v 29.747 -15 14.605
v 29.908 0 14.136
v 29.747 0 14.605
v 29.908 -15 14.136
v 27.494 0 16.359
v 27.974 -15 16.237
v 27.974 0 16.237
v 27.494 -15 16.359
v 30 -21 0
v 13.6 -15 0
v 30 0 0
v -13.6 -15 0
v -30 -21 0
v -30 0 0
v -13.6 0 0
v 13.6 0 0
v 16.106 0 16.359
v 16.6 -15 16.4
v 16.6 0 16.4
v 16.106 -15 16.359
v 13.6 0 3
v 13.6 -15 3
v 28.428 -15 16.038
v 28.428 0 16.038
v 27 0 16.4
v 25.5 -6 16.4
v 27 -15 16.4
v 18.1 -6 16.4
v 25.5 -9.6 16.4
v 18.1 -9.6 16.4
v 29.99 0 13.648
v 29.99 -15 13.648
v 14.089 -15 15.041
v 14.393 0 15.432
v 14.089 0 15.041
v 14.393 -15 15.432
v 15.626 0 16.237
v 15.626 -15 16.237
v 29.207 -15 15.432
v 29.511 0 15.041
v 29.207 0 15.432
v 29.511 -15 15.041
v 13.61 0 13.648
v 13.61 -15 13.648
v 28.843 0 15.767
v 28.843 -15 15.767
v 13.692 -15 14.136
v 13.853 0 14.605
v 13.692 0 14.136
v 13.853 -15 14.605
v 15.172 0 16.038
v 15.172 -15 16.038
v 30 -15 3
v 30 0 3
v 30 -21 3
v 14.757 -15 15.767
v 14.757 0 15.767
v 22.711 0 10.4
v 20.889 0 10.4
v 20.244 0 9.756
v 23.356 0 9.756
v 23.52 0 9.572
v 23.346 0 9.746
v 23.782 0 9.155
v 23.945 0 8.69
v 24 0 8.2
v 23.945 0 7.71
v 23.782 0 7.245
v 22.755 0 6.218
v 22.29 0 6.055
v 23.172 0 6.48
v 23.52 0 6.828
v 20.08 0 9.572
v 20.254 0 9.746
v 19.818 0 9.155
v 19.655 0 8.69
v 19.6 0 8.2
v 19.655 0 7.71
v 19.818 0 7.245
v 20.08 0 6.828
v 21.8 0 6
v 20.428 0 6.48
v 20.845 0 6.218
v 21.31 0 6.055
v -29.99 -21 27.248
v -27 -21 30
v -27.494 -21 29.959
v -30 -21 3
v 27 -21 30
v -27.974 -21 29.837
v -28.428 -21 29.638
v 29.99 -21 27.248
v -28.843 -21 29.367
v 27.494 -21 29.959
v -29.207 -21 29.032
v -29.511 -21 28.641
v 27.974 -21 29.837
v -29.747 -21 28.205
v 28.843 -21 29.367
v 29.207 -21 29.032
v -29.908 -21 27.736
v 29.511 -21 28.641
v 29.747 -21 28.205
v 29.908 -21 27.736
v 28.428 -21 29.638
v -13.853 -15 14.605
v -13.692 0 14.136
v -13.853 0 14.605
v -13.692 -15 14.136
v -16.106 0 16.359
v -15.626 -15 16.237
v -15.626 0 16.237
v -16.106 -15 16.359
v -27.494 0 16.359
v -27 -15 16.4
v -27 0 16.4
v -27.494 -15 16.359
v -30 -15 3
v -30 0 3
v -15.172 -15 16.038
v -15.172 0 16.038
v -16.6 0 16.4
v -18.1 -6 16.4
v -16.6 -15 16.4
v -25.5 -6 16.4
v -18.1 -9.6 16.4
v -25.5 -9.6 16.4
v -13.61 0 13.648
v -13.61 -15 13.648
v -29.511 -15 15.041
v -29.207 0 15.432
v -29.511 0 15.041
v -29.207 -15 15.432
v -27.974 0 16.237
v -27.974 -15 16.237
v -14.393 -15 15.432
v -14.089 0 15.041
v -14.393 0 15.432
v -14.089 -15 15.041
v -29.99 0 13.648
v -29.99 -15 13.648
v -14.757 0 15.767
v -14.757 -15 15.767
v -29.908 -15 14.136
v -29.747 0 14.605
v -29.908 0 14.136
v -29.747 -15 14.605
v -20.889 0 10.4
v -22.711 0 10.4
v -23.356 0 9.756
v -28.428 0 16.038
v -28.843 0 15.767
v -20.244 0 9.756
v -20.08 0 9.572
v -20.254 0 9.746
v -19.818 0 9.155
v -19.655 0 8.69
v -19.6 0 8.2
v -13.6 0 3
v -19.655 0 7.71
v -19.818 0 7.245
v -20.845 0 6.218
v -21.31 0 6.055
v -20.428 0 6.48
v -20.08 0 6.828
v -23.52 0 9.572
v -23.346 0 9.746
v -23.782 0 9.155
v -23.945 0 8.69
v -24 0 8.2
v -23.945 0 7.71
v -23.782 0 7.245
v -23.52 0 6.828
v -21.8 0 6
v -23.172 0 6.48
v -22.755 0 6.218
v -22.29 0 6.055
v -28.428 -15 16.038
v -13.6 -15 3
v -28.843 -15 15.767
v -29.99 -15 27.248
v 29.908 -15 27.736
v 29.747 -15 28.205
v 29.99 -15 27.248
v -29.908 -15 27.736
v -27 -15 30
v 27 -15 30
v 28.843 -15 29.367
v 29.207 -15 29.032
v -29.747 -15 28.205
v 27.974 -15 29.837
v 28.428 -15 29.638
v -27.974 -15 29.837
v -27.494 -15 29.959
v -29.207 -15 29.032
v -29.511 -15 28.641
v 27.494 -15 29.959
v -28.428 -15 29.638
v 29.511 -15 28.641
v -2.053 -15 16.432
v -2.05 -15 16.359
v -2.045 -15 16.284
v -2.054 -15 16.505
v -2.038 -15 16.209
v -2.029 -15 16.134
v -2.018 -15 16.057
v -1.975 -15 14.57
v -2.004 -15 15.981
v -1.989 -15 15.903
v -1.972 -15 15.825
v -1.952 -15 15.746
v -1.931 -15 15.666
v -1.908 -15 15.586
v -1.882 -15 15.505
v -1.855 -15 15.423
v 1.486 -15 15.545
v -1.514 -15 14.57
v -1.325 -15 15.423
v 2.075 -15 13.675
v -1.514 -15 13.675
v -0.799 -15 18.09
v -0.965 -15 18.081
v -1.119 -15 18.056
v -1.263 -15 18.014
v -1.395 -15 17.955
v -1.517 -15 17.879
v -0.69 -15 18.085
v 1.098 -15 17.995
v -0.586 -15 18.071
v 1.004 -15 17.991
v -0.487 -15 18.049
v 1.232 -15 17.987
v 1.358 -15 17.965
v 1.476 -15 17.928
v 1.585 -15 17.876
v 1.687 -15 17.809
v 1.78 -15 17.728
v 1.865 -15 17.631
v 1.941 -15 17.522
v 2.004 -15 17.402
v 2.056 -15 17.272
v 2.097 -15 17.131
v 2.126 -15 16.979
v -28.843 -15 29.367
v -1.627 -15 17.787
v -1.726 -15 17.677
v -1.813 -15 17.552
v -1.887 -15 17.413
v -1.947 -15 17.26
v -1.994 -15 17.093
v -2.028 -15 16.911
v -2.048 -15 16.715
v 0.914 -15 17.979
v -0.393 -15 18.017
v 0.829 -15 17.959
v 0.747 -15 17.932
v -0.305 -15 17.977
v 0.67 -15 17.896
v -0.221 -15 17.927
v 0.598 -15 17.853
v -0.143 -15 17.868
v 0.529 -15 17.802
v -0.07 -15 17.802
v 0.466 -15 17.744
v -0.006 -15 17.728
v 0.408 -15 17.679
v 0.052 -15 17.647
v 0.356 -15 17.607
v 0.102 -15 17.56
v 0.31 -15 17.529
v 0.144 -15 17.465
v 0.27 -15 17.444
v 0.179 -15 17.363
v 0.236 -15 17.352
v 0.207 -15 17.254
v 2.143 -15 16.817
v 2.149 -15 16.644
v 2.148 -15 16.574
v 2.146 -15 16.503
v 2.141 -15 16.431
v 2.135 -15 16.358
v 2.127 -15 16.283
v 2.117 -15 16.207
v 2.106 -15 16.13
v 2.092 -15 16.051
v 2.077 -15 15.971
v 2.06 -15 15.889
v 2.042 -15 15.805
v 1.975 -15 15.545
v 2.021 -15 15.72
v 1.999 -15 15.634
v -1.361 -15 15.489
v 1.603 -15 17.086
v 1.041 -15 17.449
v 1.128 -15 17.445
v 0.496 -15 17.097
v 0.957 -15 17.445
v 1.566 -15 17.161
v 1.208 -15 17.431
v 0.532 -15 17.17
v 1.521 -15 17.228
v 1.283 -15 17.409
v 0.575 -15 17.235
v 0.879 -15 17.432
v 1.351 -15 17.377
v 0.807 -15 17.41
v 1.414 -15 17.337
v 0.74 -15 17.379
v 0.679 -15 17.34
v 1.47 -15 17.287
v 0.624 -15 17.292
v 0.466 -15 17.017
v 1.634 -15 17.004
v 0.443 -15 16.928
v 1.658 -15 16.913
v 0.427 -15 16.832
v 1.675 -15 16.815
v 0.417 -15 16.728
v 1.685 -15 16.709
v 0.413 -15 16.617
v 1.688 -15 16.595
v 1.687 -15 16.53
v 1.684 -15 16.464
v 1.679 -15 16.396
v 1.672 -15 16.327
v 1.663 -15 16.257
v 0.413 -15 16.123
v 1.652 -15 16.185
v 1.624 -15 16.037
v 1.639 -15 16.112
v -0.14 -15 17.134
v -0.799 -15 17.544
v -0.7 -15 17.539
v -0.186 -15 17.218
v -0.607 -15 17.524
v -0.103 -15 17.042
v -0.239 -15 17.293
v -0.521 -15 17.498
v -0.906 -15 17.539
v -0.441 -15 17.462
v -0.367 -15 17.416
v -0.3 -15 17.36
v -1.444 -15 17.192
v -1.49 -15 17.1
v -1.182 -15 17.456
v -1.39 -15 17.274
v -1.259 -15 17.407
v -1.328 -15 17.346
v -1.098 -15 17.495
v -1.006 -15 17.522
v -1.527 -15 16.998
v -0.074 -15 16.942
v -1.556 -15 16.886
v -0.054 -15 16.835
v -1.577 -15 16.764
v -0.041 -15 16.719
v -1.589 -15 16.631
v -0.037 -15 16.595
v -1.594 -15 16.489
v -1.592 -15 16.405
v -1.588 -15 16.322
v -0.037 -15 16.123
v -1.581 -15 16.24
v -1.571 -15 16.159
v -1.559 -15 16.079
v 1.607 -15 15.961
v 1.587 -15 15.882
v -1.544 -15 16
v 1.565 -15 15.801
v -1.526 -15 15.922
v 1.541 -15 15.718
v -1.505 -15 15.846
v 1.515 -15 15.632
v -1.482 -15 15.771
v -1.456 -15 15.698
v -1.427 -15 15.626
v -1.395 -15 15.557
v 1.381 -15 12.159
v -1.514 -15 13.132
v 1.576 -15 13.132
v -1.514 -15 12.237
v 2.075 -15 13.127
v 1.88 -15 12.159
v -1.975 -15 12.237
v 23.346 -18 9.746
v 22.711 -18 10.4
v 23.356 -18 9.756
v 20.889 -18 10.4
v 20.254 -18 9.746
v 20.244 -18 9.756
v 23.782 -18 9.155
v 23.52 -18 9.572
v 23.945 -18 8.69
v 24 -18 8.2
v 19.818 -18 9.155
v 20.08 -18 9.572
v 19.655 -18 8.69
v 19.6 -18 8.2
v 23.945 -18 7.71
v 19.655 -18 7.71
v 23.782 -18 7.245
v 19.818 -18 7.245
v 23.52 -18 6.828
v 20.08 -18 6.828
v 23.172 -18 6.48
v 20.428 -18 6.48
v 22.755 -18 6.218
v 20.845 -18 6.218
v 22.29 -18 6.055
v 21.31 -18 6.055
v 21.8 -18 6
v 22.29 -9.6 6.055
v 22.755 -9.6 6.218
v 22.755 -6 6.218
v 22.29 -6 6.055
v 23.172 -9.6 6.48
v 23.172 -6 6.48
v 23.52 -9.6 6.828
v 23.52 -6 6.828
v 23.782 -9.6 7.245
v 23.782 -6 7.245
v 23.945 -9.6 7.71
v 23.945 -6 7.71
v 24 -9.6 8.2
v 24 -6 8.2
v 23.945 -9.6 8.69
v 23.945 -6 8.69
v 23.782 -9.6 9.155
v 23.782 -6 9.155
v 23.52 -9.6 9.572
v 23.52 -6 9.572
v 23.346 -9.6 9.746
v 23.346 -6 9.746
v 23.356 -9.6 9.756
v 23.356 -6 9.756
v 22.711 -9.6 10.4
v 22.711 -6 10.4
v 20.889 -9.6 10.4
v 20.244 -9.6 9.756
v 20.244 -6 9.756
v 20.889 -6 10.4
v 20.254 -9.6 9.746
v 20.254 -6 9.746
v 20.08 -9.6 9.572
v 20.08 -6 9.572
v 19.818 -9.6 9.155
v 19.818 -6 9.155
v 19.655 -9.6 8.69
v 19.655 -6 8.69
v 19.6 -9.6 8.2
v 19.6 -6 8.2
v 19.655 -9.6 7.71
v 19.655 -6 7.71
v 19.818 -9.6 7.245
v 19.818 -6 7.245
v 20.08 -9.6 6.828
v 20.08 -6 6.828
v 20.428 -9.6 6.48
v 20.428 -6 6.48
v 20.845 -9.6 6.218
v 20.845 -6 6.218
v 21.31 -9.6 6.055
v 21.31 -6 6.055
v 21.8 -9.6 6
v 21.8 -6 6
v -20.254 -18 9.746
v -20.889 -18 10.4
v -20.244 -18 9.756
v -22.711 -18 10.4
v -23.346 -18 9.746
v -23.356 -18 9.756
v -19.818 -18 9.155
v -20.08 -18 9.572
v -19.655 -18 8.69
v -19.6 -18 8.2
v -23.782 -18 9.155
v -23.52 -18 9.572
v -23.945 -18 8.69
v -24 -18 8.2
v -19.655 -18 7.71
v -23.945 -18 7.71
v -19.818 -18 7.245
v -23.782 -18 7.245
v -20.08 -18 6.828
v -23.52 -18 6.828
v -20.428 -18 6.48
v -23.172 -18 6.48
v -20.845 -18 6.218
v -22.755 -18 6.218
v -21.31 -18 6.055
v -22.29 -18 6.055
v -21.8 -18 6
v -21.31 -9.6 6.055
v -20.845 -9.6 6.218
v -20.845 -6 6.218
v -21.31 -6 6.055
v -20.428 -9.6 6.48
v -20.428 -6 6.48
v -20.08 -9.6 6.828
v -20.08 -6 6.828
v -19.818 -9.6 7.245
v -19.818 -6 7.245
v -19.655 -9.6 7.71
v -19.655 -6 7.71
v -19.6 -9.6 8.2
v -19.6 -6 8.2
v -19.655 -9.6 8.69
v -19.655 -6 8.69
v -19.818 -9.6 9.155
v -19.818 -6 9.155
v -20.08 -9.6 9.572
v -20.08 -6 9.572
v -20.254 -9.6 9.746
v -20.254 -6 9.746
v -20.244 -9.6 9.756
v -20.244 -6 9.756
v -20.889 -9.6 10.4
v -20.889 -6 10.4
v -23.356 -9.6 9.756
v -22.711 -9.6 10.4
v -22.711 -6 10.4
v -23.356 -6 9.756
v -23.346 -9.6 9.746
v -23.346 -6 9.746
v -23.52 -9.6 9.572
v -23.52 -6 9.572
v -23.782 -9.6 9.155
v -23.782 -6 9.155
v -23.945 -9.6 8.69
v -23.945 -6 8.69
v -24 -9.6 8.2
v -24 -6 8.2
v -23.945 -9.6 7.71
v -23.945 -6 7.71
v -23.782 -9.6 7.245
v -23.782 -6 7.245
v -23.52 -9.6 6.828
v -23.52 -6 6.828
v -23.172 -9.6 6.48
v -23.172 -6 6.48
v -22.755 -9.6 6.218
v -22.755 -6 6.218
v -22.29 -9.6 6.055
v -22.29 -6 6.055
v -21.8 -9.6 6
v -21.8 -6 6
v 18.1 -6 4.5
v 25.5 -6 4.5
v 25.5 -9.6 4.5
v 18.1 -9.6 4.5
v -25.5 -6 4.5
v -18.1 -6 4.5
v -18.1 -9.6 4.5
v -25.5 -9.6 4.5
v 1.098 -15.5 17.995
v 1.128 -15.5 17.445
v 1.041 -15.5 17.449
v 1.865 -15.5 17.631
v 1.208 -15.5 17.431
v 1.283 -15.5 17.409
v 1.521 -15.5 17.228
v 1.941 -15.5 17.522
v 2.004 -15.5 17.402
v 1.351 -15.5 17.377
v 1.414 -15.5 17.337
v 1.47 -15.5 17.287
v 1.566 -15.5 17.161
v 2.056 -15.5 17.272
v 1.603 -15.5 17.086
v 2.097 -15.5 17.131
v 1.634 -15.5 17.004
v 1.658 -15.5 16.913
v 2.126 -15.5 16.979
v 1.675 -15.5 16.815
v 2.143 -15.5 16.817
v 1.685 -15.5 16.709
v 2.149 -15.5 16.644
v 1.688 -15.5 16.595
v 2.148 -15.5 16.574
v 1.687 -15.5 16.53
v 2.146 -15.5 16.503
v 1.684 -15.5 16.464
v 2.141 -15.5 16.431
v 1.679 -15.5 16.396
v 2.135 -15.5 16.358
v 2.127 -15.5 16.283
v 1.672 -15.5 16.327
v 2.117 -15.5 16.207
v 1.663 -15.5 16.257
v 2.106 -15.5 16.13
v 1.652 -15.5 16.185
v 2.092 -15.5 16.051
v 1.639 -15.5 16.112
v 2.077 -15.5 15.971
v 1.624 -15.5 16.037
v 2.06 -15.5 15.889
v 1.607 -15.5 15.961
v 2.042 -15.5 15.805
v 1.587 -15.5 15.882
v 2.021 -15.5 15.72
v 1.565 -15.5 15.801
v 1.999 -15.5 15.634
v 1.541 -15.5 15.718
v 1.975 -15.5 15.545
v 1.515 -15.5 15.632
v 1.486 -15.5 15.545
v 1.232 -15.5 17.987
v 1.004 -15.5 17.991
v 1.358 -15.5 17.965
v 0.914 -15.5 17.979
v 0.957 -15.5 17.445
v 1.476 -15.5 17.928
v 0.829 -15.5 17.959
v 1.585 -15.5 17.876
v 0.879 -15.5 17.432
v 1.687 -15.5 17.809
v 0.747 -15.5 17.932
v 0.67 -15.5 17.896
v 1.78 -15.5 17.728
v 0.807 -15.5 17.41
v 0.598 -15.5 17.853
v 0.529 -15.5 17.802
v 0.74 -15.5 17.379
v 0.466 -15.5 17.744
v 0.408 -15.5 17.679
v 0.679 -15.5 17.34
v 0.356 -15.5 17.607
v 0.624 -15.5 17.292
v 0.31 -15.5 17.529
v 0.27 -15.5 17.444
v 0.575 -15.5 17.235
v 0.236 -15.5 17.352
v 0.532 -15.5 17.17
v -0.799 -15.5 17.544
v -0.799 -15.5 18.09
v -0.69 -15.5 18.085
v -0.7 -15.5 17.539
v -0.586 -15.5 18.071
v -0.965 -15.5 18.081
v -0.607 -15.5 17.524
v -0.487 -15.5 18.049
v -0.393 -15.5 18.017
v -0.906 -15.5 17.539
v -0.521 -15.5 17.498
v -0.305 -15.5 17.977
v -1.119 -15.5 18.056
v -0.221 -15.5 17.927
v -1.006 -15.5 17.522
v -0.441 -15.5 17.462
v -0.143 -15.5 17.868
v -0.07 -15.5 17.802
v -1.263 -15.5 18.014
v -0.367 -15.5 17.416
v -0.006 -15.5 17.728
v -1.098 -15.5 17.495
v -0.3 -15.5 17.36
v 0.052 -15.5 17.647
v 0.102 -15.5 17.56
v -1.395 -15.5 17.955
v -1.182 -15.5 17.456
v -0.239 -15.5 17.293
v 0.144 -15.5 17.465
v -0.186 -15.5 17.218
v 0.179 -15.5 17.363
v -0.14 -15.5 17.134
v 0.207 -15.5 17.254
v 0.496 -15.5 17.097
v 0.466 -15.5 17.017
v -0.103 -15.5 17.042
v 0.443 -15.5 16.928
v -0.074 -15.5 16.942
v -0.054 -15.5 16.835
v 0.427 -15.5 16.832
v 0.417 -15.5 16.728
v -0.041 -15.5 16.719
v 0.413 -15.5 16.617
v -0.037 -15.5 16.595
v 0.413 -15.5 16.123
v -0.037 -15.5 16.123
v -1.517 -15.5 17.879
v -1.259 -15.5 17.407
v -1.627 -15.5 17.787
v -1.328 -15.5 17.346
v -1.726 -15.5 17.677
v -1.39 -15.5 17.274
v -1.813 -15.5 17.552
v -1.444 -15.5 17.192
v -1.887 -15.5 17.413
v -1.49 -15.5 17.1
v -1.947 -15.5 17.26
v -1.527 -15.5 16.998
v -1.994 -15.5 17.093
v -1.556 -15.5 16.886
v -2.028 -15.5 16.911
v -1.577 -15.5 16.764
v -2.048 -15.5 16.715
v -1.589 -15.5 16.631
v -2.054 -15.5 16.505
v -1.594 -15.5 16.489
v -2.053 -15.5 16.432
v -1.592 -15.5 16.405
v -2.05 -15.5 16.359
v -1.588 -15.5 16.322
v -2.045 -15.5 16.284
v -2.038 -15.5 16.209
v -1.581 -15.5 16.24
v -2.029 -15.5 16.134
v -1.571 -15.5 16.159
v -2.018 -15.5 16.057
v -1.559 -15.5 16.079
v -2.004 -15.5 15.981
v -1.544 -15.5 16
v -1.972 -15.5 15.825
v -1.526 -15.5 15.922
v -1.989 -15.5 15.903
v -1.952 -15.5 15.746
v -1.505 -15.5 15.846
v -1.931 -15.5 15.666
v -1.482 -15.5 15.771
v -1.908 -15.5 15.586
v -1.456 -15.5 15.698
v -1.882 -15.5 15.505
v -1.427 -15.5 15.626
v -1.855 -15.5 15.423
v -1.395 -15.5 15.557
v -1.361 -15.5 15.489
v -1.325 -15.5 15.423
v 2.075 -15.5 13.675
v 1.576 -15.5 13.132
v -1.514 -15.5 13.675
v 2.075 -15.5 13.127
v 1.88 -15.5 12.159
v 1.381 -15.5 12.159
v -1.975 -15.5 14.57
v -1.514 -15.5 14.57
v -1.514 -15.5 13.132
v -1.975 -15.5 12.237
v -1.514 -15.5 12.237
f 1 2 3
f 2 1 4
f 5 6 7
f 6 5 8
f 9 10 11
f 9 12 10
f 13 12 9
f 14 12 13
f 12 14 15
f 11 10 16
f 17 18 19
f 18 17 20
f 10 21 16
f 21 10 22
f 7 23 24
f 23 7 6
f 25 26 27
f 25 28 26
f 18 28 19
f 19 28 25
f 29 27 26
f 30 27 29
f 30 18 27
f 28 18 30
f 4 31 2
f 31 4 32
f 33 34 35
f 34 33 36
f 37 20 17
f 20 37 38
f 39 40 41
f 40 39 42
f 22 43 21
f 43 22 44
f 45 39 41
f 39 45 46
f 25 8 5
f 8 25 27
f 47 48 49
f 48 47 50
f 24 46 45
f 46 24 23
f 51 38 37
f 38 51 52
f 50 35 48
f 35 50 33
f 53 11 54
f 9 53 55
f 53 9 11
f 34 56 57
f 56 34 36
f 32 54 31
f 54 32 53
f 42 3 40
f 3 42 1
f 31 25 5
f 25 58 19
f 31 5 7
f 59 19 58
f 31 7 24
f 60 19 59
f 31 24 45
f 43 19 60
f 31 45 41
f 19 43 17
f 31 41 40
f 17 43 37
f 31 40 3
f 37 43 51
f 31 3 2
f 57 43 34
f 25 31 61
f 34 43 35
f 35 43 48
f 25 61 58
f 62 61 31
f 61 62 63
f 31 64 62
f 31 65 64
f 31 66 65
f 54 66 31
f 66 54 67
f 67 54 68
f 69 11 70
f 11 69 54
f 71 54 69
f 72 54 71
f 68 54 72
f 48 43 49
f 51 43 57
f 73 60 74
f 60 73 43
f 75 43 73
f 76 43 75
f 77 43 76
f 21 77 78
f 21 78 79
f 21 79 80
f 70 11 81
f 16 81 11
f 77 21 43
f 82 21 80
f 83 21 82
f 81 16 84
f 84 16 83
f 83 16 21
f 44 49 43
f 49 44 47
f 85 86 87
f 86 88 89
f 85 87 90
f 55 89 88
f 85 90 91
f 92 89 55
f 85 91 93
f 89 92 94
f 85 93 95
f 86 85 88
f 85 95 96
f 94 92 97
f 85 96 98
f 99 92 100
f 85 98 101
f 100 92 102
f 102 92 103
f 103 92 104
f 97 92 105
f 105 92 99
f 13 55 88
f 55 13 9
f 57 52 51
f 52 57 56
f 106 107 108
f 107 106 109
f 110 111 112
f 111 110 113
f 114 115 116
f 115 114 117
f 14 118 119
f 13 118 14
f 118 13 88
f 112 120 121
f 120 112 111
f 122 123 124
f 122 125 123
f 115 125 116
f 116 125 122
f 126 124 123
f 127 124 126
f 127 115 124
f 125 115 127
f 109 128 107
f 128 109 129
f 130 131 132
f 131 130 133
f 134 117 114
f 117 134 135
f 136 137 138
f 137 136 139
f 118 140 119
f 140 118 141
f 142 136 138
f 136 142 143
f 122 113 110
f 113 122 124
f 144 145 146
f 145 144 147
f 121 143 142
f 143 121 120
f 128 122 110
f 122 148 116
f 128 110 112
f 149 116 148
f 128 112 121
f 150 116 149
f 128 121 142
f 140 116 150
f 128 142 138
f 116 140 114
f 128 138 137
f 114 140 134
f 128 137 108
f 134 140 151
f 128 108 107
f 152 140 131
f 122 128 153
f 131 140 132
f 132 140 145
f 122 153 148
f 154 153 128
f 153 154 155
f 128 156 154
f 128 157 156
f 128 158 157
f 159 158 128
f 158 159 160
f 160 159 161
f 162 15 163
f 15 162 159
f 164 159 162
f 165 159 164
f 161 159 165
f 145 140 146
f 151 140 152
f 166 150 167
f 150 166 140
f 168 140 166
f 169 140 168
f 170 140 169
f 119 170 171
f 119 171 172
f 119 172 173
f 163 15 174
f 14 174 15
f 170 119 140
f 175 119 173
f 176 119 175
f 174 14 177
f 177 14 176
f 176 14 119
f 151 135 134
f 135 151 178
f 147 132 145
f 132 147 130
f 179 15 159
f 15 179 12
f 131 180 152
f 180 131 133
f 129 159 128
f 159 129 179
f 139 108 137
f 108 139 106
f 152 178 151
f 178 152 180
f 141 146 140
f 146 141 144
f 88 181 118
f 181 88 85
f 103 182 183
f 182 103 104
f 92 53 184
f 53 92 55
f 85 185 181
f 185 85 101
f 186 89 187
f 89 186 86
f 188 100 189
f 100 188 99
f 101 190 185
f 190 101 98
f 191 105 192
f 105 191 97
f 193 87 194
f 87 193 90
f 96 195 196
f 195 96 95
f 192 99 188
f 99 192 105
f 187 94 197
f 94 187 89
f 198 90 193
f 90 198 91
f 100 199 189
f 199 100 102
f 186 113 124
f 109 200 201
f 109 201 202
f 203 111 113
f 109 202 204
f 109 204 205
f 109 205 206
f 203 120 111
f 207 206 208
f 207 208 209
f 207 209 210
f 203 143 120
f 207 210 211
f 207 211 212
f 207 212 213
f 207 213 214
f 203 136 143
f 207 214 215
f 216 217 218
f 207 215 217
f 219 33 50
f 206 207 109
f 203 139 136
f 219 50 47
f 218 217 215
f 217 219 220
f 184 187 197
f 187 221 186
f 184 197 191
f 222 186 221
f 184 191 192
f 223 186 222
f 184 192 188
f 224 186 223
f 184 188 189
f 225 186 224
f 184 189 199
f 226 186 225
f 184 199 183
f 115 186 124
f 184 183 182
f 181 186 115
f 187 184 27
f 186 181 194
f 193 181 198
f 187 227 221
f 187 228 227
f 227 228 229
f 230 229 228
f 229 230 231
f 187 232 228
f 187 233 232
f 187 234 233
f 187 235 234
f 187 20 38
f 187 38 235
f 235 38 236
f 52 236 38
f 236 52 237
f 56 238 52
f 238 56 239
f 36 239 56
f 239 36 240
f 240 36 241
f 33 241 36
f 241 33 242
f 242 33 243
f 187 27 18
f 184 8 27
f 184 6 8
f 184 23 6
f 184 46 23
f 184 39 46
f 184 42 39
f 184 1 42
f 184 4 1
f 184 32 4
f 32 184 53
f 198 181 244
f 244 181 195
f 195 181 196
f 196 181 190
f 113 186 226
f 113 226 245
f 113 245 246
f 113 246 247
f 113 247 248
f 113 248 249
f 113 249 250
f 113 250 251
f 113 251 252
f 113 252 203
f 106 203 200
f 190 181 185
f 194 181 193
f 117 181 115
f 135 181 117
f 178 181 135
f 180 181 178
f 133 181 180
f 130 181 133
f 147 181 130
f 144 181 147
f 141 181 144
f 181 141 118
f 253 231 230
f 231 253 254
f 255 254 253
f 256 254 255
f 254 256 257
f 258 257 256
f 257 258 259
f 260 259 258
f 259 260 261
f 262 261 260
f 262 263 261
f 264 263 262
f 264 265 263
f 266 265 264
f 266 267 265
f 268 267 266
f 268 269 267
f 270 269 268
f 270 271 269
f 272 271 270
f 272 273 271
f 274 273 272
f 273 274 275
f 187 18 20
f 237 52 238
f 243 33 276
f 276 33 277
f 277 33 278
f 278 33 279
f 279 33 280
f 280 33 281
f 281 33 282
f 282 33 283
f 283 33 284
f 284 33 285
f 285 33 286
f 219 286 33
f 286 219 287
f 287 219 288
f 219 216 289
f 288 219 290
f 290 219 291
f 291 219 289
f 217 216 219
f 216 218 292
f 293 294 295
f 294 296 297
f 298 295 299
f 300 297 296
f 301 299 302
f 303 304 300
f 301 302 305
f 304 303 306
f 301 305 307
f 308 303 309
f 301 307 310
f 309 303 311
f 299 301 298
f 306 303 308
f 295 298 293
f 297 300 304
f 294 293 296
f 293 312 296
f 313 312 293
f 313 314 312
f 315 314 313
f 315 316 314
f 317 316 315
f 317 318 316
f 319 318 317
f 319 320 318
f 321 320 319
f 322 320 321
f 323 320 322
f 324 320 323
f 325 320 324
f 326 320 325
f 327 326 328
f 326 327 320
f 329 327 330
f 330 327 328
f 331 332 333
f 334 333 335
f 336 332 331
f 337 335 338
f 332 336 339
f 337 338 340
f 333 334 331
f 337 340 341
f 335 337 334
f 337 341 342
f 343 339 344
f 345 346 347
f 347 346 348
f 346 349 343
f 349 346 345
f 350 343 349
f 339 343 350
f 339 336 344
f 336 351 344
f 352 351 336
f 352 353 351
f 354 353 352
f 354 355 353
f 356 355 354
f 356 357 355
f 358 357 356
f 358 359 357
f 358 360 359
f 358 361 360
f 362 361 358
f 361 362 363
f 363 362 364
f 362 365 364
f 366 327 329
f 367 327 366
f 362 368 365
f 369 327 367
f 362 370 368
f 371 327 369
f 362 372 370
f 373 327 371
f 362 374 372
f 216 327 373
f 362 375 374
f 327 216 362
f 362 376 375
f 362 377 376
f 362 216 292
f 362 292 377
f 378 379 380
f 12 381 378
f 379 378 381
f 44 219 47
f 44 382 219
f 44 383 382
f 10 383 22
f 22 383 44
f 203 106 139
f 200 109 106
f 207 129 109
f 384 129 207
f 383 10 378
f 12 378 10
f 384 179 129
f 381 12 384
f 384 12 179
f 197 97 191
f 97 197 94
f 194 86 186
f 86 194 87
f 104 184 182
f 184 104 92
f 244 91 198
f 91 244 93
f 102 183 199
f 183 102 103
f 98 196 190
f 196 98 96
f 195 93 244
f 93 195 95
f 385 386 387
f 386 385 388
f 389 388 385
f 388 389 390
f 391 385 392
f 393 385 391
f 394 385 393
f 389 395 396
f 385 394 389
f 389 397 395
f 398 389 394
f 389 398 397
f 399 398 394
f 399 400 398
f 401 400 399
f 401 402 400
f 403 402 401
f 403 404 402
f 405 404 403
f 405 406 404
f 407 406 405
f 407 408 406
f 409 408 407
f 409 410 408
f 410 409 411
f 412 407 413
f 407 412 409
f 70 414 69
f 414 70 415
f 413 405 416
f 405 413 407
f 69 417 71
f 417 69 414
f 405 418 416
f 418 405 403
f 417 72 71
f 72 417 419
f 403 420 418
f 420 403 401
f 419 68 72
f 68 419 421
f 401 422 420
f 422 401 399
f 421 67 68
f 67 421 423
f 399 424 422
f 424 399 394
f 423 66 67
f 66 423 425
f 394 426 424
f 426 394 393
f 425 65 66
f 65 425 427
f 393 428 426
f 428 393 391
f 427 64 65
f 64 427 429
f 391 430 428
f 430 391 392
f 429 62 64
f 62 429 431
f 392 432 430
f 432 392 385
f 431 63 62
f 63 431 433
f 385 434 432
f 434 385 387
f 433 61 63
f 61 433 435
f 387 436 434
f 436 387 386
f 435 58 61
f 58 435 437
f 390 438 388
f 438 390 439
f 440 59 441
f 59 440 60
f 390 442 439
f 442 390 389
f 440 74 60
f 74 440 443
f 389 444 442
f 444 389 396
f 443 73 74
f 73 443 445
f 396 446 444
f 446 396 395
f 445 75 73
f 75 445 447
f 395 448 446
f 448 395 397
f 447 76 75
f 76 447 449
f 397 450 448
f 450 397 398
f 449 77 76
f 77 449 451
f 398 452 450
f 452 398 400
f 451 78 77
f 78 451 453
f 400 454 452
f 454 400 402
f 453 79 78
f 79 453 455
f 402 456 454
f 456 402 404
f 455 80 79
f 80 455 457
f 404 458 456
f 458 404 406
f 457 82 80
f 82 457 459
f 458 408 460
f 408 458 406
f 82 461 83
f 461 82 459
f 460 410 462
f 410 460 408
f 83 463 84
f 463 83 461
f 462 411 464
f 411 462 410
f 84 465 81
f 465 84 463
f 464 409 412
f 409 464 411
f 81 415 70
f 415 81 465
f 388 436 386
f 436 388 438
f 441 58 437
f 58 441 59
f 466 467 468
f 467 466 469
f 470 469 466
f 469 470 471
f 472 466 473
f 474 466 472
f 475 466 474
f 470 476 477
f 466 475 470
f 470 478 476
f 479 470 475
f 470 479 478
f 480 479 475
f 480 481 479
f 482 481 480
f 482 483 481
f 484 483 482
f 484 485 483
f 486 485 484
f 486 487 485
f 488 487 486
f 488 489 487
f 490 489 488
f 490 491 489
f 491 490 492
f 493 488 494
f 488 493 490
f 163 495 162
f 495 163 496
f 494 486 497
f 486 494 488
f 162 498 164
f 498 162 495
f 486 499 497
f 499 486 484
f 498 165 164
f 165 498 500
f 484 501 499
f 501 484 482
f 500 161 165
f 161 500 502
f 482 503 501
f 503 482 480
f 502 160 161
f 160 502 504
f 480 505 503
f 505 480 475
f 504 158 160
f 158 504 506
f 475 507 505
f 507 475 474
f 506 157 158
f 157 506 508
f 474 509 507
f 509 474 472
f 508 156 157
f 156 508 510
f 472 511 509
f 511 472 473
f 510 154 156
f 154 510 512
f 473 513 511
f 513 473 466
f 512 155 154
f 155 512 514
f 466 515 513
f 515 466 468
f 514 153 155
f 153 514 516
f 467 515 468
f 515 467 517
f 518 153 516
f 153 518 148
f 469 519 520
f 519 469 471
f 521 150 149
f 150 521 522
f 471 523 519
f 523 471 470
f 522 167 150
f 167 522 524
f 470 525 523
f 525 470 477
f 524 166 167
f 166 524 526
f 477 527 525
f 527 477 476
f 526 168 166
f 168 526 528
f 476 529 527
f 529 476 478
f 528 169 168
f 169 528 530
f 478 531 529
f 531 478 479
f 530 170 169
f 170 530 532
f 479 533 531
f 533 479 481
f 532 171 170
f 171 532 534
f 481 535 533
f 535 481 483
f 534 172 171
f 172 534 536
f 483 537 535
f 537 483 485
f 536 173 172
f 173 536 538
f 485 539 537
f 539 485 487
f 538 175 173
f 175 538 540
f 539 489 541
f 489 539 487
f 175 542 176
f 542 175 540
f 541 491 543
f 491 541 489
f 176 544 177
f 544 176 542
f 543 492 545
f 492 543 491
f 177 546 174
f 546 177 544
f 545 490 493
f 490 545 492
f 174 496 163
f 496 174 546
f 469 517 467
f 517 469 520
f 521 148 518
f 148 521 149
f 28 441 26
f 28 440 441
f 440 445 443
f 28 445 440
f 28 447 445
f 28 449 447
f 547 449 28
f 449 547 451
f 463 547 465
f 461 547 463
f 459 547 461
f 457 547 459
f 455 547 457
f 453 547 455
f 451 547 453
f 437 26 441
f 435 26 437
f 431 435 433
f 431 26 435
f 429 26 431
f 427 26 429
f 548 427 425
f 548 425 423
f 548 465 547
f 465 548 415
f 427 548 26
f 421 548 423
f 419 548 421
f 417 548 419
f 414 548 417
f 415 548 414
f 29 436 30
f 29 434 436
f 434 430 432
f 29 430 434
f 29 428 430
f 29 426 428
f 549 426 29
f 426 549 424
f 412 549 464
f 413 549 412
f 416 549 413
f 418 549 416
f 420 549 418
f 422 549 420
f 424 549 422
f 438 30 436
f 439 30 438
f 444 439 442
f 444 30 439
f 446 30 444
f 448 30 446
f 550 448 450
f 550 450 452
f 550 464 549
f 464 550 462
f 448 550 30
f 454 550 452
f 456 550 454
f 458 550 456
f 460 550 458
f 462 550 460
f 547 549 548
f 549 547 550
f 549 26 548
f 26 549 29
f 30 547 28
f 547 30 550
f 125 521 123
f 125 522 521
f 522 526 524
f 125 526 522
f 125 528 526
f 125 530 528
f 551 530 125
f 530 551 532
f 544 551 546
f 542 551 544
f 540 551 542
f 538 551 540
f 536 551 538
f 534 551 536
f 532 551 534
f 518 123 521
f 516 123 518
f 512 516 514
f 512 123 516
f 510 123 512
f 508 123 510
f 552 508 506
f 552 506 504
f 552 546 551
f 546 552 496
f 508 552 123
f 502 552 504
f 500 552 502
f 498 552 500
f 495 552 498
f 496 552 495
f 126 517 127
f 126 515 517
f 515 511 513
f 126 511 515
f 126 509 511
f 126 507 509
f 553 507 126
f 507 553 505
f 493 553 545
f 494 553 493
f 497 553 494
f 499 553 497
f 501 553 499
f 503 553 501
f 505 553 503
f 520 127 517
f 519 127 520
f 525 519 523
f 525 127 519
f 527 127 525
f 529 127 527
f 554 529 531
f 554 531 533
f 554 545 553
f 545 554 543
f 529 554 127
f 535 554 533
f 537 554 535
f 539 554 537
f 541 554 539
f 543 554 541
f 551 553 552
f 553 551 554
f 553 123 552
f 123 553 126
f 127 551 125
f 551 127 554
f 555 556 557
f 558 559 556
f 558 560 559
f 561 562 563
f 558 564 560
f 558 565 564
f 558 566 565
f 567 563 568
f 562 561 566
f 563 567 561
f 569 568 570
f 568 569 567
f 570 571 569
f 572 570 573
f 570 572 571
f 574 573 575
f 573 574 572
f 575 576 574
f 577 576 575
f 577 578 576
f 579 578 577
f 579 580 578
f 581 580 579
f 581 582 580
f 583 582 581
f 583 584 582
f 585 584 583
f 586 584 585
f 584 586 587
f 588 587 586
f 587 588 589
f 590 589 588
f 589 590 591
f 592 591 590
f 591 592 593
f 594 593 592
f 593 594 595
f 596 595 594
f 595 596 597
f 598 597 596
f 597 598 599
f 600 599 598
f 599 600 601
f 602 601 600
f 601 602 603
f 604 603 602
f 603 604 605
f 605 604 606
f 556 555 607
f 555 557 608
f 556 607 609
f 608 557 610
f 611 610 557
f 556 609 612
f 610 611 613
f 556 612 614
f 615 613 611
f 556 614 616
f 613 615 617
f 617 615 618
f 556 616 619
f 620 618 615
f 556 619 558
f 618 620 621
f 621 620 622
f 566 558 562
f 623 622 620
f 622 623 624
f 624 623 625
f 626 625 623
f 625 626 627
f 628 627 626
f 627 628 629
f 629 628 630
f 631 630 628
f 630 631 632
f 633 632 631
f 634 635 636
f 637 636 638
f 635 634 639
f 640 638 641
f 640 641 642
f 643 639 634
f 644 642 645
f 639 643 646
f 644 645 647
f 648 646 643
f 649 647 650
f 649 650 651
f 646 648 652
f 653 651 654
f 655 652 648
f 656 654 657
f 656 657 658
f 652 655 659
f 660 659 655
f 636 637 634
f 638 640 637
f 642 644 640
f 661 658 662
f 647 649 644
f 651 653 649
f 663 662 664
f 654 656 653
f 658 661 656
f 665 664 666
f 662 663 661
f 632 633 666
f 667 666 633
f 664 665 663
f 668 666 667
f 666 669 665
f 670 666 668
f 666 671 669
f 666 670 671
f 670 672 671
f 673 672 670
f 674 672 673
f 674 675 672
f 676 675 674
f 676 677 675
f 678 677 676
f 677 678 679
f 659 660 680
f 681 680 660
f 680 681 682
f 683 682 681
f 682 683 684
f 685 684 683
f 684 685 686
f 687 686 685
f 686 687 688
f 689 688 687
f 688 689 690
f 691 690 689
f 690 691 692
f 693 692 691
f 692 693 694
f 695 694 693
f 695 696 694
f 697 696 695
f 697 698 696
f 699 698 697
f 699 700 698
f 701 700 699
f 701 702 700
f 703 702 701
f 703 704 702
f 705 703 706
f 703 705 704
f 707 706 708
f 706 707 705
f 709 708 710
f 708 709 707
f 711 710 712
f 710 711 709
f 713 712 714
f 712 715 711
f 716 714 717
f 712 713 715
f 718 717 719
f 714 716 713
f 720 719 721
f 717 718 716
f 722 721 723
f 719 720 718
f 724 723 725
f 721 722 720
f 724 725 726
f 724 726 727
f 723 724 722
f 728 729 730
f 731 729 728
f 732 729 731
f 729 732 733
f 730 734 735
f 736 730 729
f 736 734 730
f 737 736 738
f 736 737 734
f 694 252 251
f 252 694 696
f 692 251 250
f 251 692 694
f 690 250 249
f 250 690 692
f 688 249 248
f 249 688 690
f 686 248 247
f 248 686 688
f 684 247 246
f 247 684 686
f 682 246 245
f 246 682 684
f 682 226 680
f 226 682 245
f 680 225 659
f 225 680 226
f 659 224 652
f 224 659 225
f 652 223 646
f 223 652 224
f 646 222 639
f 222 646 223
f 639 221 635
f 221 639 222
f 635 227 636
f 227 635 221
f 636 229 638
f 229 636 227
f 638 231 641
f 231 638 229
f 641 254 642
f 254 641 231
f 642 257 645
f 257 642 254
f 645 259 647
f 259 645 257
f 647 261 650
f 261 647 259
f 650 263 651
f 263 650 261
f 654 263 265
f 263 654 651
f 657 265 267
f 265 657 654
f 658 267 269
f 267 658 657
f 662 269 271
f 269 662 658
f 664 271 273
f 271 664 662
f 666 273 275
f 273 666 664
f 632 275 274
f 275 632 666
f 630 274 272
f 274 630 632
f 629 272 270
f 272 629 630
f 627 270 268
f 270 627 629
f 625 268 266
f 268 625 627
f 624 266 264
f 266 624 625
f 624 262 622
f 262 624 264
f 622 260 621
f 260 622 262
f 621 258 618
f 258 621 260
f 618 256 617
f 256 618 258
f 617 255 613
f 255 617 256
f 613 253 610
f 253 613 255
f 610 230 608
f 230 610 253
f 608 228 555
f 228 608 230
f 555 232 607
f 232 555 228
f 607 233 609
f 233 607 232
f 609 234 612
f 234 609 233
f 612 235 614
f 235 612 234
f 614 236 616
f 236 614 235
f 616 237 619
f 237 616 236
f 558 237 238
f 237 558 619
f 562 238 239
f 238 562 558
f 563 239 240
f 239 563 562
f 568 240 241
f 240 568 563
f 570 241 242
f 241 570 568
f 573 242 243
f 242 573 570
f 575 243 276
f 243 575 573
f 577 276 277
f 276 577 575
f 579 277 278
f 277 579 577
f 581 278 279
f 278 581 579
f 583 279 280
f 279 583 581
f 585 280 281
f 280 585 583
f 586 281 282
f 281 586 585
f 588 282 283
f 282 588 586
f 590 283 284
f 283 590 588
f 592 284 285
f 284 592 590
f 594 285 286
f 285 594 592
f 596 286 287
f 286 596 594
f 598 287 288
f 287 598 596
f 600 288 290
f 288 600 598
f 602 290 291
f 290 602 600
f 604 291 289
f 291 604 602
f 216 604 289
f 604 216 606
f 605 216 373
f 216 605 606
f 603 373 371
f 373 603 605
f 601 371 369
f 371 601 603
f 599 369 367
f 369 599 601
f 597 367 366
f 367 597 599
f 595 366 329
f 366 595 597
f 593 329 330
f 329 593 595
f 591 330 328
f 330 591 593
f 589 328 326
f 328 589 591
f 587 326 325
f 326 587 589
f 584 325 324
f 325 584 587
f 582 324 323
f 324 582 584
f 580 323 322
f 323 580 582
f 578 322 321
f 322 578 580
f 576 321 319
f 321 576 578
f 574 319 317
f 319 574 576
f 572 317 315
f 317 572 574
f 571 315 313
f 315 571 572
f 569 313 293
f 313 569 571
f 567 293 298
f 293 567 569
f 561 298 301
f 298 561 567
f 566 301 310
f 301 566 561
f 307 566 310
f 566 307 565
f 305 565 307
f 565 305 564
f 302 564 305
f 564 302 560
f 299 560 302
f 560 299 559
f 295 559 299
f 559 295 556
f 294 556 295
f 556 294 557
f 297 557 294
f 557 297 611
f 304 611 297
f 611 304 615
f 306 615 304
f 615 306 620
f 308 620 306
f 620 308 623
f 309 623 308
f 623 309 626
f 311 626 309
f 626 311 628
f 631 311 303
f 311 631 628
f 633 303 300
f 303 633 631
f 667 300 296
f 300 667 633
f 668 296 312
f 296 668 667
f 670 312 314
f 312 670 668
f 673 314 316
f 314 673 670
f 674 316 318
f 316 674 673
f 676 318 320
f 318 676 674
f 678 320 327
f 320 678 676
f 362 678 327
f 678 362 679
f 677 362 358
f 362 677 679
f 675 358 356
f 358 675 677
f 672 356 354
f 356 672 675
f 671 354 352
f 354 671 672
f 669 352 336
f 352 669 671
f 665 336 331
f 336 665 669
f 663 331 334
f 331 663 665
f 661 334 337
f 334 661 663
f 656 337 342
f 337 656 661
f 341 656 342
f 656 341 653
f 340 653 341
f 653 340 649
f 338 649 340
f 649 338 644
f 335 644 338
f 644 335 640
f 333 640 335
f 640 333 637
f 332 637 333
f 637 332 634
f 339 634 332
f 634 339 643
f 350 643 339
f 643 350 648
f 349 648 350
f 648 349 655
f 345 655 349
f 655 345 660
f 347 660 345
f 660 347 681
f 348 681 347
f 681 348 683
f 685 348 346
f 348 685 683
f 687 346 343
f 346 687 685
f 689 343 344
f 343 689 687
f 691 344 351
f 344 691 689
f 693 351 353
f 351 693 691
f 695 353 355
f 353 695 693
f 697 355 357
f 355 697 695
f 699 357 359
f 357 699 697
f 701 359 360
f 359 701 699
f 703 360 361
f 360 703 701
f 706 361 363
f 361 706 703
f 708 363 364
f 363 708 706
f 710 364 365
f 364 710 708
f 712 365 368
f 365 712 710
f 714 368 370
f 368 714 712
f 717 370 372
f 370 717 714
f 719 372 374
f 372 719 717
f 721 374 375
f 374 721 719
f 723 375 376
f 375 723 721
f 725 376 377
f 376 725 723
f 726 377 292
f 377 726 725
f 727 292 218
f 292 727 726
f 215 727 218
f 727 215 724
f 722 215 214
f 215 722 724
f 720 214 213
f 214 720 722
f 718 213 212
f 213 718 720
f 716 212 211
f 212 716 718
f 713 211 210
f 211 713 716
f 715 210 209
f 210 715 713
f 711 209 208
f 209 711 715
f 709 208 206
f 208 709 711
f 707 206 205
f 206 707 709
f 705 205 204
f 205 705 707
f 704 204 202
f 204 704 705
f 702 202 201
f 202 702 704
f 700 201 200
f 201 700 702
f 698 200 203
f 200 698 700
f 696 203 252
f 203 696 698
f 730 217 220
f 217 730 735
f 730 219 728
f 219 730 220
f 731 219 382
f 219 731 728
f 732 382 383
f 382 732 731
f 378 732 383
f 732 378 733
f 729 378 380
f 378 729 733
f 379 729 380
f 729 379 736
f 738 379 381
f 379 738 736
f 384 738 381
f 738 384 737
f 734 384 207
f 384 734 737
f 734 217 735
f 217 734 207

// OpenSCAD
/*******************************************************************

This OpenSCAD code and its rendered 3D model are part of the

	Kühling&Kühling RepRap Industrial 3D Printer


All details, BOM, assembling instructions and latest sources:
	http://kuehlingkuehling.de

Designed and developed by:
	Jonas Kühling <mail@jonaskuehling.de>
	Simon Kühling <mail@simonkuehling.de>

License:
	Creative Commons Attribution-ShareAlike 4.0 International (CC BY-SA 4.0)
	https://creativecommons.org/licenses/by-sa/4.0/

*******************************************************************/

include <configuration.scad>




// RENDERING

// 2x
rotate([0,90,0])
    difference(){
        frame_enclosure_door_handle();
        translate([-frame_enclosure_door_handle_body_width/2,-frame_enclosure_door_handle_body_length+2*wall,0])
            label("13",orientation="back");
    }




module frame_enclosure_door_handle(){
	difference(){

		// main body
		union(){
			hull(){
				for(k=[1,-1])
					translate([-frame_enclosure_door_handle_body_width+wall,-frame_enclosure_door_handle_body_length+2*wall,k*(frame_enclosure_door_handle_body_height/2-wall)])
						rotate([90,0,0])
							cylinder(r=wall,h=2*wall);
				translate([-wall,-frame_enclosure_door_handle_body_length,-frame_enclosure_door_handle_body_height/2])
					cube([wall,2*wall,frame_enclosure_door_handle_body_height]);
			}
			for(i=[1,-1])
				translate([0,0,i*(frame_enclosure_door_handle_body_height/2-2*wall-clearance-frame_screw_dia/2)])
					hull(){
						for(j=[1,-1])
							translate([-2*(frame_screw_dia/2+clearance+2*wall)+wall,0,j*(frame_screw_dia/2+clearance+2*wall-wall)])
								rotate([90,0,0])
									cylinder(r=wall,h=frame_enclosure_door_handle_body_length);
						translate([-wall,-frame_enclosure_door_handle_body_length,-(frame_screw_dia/2+clearance+2*wall)])
							cube([wall,frame_enclosure_door_handle_body_length,2*(frame_screw_dia/2+clearance+2*wall)]);
					}

		}

		// frame enclosure door mount screw holes and nut traps
		for(i=[1,-1])
			translate([-2*wall-clearance-frame_screw_dia/2,0,i*(frame_enclosure_door_handle_body_height/2-2*wall-clearance-frame_screw_dia/2)])
				rotate([0,0,-90])
					rotate([90,0,0])
						teardrop(frame_screw_dia/2+clearance,2*(frame_enclosure_door_handle_body_length-wall));
		for(i=[1,-1])
			translate([-2*wall-clearance-frame_screw_dia/2,-frame_screw_nut_height/2-clearance-2*wall,i*(frame_enclosure_door_handle_body_height/2-2*wall-clearance-frame_screw_dia/2)])
				rotate([0,0,180])
					rotate([90,0,0])
						nut_slot_square(frame_screw_nut_wrench,frame_screw_nut_height,frame_enclosure_door_handle_body_width);

	}
}
